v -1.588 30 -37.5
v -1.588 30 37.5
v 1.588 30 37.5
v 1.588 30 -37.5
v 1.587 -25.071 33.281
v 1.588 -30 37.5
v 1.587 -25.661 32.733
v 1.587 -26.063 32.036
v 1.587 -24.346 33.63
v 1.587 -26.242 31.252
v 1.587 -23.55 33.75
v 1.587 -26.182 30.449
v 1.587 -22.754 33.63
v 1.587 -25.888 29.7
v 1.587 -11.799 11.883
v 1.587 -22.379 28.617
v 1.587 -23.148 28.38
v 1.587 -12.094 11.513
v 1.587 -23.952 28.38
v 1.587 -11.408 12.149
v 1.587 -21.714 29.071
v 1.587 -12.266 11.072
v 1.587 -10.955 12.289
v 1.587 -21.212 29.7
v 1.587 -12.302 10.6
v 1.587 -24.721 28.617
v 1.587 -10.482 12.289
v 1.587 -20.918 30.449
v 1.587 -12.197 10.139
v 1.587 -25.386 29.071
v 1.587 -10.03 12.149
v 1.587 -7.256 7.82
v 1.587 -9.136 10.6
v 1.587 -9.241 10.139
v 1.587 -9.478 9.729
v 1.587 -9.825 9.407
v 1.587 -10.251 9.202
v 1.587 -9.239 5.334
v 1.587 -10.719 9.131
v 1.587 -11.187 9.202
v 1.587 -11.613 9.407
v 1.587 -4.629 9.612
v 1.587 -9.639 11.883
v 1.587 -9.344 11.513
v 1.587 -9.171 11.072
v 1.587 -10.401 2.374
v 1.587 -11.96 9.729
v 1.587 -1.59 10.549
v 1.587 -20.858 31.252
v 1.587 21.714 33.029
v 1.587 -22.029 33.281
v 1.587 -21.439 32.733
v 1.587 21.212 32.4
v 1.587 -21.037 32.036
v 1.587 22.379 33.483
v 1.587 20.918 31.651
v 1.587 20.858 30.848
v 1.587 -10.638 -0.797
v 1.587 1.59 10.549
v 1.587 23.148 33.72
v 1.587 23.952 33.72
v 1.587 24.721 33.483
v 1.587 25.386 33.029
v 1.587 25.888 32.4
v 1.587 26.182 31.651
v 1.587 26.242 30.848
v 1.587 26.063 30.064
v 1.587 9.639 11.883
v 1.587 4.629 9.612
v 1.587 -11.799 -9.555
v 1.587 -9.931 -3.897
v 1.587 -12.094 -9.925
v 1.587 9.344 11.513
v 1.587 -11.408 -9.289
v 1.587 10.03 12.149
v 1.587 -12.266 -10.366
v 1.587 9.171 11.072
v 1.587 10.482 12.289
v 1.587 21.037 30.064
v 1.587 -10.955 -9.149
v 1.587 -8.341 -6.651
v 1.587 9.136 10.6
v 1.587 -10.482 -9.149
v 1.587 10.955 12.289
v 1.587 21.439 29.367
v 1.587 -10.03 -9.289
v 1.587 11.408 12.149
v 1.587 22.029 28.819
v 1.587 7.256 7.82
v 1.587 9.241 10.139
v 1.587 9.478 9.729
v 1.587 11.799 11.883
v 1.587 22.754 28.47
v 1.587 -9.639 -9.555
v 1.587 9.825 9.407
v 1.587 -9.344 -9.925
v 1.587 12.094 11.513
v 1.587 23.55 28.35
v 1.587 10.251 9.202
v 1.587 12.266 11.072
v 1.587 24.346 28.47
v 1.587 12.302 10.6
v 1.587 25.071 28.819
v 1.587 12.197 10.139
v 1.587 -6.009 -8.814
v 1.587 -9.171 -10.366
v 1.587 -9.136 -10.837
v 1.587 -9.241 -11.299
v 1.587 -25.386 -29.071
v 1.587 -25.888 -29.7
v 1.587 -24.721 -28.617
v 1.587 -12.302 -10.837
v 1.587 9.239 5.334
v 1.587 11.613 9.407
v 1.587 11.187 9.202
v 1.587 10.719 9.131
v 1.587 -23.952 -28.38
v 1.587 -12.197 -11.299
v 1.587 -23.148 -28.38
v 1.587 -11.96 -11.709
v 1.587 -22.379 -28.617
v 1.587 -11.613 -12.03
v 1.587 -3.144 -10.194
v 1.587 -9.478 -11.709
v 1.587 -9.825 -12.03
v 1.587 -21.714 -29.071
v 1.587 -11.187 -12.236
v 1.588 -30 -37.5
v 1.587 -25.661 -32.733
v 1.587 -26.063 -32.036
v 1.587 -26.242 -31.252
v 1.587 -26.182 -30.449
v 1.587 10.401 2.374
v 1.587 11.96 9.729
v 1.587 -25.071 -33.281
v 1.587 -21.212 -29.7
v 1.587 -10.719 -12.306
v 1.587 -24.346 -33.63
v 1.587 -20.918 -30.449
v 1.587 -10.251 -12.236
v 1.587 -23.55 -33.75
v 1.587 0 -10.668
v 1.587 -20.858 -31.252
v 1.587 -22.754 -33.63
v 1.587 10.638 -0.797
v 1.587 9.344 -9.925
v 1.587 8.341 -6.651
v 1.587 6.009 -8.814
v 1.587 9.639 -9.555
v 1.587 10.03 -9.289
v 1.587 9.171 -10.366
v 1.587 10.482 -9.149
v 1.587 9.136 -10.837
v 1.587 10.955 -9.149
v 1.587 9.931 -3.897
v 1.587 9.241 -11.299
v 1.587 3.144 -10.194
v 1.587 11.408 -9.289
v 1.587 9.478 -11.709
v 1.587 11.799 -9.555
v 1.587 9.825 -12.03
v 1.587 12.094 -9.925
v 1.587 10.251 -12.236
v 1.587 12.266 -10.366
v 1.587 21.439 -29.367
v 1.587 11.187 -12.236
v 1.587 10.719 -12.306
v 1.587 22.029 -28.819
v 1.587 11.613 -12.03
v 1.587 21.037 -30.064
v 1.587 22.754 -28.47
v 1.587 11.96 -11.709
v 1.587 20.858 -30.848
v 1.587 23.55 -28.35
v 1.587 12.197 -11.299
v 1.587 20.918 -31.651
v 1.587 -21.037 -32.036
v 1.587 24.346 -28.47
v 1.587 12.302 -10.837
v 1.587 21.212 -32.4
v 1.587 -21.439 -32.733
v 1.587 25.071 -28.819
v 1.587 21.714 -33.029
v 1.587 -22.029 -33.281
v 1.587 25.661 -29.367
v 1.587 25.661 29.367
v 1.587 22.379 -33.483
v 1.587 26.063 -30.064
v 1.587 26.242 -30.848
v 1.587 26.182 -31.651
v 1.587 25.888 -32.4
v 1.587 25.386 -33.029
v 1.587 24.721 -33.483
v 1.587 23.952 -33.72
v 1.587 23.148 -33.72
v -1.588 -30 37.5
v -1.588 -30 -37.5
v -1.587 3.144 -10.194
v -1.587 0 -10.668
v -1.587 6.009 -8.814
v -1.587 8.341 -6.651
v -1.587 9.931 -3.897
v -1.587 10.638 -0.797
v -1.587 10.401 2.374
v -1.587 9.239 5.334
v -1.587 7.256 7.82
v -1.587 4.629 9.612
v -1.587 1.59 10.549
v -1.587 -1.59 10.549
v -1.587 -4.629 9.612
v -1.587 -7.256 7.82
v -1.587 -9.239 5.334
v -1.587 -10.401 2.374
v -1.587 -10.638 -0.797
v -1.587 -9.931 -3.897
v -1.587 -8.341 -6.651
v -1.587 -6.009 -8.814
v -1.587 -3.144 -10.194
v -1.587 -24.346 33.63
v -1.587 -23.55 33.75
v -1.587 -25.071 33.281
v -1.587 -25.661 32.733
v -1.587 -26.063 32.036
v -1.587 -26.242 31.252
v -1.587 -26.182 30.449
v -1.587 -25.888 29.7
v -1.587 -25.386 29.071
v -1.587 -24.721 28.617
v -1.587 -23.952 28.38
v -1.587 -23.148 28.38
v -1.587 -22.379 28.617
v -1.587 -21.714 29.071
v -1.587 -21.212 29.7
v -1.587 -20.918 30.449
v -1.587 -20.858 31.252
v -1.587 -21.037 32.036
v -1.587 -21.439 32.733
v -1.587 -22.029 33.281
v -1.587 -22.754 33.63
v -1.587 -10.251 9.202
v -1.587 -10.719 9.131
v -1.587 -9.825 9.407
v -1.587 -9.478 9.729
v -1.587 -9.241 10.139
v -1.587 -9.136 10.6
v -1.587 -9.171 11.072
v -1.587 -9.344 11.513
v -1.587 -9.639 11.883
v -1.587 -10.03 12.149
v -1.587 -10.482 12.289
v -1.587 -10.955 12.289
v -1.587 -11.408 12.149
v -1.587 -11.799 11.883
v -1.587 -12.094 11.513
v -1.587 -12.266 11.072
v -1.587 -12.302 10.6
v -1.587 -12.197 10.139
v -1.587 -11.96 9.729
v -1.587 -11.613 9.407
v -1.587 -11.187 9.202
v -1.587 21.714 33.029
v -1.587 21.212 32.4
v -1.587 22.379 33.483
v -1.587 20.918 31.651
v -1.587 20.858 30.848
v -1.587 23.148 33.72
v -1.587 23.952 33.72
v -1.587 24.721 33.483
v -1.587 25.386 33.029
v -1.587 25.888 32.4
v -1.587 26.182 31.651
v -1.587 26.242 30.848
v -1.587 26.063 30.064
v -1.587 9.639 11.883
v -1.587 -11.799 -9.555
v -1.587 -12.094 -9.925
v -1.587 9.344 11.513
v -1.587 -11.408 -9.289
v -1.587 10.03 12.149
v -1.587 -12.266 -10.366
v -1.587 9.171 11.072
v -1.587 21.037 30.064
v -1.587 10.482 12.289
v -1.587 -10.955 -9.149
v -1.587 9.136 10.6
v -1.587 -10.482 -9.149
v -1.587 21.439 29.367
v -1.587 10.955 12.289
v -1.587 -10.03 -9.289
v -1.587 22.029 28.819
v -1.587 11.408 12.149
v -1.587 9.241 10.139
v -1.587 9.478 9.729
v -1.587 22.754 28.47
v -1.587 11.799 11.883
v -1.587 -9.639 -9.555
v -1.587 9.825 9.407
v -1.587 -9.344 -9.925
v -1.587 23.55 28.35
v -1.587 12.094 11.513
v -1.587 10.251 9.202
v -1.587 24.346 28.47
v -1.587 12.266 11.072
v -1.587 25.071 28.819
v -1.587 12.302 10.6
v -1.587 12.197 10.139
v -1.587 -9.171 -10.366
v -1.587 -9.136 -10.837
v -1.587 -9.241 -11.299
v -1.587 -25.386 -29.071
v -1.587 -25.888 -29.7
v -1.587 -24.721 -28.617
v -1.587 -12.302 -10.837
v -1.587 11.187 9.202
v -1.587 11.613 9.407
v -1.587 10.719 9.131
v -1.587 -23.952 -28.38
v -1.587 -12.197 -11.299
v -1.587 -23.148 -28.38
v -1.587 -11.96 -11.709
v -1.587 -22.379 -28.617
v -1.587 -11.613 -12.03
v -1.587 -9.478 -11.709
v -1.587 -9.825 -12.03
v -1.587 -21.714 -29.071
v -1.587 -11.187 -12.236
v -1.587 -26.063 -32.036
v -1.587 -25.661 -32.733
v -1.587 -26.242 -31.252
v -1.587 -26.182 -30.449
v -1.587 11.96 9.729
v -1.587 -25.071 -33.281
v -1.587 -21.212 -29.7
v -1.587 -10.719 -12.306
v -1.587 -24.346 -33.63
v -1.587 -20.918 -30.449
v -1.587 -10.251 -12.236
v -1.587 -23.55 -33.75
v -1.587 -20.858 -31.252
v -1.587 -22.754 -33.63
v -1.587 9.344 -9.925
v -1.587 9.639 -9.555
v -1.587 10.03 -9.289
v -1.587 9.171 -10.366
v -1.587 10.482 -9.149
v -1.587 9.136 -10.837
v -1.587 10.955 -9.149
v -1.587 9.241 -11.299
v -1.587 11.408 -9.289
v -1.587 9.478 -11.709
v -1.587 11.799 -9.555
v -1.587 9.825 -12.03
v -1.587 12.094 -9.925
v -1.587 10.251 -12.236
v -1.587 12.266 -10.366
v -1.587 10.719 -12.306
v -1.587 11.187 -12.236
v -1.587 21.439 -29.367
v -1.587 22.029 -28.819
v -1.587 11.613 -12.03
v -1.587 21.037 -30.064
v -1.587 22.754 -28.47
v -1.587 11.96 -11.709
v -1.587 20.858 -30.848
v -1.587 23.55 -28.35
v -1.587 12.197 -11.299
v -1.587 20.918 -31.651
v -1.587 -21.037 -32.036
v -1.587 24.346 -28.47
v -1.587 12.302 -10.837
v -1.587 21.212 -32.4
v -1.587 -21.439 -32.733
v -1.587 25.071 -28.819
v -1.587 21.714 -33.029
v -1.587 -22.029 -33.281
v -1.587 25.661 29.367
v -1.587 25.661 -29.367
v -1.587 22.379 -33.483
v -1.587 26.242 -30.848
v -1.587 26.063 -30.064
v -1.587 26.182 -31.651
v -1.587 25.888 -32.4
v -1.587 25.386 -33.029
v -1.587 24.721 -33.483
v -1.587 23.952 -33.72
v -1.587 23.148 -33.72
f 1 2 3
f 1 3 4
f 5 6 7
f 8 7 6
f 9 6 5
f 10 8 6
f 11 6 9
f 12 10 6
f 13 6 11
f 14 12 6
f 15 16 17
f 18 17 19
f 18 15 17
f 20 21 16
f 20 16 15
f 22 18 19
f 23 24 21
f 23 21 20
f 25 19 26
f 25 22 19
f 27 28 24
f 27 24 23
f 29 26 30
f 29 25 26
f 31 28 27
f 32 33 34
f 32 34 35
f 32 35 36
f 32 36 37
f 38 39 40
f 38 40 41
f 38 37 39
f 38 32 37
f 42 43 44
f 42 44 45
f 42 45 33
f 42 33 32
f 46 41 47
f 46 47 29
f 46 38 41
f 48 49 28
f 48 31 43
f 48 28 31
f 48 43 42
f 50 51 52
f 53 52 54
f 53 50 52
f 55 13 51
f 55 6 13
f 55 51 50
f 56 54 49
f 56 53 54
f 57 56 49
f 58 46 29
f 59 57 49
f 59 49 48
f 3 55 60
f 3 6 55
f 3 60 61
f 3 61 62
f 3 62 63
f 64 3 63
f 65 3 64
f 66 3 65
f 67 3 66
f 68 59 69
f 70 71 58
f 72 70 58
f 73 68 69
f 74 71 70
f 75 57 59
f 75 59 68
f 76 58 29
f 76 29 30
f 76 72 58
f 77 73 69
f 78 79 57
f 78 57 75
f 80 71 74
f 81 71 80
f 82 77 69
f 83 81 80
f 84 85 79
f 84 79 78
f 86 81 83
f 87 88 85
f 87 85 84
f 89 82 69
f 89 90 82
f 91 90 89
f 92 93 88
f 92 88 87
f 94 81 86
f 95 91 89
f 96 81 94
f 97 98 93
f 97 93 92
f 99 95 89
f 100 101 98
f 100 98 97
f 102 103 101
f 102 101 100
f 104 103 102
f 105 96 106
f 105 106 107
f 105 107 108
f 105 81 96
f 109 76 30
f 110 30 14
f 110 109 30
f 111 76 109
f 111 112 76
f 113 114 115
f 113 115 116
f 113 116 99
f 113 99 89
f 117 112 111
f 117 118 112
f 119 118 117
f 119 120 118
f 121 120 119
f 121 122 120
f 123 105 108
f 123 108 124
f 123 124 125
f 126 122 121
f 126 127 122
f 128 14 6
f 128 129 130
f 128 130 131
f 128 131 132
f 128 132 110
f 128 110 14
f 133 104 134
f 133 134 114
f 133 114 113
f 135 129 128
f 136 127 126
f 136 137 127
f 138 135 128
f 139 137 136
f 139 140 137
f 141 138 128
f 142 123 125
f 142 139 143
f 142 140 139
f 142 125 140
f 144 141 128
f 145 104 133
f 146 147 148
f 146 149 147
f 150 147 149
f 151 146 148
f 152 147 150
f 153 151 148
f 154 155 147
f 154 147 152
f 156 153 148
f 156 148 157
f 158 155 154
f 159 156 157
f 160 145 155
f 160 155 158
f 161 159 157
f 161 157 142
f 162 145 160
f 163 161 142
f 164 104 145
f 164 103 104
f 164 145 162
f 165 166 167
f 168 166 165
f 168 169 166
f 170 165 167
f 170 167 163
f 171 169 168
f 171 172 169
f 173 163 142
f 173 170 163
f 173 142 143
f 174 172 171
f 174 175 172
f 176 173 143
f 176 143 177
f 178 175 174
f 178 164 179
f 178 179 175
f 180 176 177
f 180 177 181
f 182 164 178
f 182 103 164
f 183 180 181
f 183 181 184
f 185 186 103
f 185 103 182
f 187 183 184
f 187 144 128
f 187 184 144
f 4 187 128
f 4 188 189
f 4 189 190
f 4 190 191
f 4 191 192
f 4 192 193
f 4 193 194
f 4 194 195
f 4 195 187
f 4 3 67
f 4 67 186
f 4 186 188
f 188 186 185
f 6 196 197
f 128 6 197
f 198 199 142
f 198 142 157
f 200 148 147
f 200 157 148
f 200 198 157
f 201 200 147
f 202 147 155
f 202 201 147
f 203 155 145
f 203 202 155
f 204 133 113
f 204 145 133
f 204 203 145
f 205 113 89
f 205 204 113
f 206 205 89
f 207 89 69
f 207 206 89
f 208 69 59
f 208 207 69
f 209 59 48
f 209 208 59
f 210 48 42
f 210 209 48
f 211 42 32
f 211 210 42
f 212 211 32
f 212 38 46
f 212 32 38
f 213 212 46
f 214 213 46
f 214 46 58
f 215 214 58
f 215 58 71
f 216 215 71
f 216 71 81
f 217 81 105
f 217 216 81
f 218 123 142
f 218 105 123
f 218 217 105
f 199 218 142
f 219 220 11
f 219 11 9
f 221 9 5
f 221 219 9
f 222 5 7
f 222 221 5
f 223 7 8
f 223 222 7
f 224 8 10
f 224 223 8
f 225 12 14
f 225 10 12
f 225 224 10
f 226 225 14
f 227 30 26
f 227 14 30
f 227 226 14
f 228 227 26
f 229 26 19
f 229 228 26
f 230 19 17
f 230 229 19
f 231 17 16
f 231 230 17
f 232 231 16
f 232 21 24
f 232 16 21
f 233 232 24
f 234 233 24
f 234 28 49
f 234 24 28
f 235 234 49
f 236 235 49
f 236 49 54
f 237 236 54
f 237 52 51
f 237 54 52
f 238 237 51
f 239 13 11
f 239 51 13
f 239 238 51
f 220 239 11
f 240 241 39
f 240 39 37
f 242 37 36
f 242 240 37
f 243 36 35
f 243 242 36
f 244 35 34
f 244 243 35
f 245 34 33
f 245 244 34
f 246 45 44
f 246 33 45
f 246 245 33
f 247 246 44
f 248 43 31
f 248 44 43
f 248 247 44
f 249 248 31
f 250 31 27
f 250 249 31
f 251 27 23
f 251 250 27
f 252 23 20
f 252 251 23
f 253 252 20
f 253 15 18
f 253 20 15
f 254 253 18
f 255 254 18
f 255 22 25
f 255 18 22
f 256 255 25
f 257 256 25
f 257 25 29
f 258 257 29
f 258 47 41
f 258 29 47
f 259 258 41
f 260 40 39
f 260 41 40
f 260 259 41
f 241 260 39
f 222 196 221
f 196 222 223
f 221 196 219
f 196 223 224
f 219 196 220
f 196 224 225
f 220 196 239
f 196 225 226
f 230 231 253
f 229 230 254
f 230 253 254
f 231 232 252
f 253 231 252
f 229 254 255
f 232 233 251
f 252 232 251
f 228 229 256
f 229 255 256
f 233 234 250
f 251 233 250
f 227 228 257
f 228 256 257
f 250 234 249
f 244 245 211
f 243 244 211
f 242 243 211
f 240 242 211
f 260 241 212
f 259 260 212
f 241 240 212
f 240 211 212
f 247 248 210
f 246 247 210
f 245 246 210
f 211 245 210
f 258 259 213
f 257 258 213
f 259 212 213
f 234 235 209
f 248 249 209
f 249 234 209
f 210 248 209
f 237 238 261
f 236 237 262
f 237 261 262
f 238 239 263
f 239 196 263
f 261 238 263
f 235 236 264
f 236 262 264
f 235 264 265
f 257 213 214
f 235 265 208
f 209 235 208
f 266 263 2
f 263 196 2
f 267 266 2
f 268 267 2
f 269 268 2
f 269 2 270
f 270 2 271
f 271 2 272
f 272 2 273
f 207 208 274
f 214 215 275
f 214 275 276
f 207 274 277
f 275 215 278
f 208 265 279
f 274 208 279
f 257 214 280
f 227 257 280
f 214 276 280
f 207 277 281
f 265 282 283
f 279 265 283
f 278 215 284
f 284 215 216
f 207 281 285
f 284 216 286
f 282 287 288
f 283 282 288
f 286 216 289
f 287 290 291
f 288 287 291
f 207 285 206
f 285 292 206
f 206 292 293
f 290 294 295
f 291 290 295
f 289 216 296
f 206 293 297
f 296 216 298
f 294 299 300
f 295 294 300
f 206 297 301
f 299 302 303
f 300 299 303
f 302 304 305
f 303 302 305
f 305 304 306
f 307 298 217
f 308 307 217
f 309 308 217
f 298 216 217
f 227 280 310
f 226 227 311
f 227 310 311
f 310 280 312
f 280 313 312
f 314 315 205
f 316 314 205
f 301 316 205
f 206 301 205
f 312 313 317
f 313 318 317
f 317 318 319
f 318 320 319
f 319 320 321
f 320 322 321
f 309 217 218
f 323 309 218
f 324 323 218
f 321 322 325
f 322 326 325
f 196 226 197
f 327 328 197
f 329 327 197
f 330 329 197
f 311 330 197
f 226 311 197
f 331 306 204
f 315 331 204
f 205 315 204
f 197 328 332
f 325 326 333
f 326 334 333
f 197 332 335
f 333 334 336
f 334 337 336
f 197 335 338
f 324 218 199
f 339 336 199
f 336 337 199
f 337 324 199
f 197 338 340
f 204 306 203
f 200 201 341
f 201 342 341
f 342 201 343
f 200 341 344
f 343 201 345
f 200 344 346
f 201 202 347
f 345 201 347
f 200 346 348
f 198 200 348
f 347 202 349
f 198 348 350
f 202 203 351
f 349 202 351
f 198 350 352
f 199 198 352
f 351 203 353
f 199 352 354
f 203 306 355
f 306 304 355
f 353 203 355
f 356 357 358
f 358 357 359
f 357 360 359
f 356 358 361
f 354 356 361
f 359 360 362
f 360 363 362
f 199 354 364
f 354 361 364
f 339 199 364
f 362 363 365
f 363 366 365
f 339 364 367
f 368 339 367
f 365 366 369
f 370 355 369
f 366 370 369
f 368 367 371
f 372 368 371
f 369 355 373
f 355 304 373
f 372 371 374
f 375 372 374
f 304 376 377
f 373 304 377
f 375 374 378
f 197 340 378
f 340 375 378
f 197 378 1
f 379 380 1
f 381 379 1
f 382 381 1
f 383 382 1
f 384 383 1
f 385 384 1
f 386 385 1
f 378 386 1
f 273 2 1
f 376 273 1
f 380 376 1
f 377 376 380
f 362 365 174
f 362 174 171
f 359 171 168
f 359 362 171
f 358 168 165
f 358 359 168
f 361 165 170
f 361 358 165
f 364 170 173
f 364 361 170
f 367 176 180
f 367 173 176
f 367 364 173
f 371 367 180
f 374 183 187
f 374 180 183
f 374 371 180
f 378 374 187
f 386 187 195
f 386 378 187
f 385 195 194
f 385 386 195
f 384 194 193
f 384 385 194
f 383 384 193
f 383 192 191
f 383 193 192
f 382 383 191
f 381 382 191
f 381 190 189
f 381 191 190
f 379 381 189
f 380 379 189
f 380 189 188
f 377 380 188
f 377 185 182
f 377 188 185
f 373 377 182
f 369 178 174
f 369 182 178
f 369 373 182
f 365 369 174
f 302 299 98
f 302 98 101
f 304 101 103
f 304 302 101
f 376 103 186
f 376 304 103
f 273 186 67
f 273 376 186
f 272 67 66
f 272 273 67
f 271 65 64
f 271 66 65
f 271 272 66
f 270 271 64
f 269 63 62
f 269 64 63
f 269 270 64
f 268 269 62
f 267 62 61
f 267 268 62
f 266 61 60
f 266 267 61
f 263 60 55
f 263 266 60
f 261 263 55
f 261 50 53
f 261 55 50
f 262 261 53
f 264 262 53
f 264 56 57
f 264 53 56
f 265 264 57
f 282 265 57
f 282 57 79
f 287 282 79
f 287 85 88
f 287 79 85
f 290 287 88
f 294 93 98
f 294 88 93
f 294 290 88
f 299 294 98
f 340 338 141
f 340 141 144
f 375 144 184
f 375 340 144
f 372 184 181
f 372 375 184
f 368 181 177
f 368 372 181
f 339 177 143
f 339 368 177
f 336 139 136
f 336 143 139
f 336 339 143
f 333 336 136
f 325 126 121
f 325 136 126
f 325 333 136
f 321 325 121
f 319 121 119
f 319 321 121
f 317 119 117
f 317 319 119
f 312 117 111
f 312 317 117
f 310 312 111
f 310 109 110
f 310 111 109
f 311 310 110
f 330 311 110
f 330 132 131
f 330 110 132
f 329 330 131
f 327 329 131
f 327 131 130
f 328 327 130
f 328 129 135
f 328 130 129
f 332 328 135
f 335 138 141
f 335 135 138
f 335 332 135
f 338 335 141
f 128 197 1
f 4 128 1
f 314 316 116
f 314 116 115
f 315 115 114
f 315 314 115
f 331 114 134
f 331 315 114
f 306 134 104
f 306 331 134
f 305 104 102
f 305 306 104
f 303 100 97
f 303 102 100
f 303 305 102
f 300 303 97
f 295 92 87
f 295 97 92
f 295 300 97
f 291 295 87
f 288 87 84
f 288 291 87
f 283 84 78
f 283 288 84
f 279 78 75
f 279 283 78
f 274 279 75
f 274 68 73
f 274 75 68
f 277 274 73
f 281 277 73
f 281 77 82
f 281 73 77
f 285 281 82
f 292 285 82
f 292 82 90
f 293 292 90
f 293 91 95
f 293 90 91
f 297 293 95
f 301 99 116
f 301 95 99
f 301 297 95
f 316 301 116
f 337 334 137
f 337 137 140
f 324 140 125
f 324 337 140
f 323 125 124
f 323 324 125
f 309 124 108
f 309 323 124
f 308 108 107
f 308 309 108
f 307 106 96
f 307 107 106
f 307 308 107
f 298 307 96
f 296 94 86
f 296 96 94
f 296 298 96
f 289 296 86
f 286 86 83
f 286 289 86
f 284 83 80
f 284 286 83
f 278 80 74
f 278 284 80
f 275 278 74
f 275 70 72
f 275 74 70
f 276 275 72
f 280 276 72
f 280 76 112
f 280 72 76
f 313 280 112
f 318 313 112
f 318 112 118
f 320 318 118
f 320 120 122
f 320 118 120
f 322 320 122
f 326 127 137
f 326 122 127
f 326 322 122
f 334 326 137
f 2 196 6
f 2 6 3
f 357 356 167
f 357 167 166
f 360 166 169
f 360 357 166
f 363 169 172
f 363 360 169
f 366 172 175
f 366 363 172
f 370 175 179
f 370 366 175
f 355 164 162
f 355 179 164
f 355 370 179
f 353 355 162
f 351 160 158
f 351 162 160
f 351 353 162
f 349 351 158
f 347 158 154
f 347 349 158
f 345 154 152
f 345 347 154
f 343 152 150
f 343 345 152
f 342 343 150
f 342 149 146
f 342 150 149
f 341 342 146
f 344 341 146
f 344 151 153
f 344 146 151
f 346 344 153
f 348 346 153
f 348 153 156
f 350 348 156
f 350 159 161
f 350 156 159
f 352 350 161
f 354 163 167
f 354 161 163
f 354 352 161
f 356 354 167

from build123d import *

# Parameters (mm, degrees)
BOSS_EXTRUDE1_DEPTH      = 1.5875
BOSS_EXTRUDE1_DEPTH_BACK = 1.5875
SKETCH1_W                = 75
SKETCH1_H                = 60
CUT_EXTRUDE1_DEPTH       = 49.049663435
CUT_EXTRUDE1_DEPTH_BACK  = 49.049663435
SKETCH2_R                = 2.7
CUT_EXTRUDE2_DEPTH       = 49.049663435
CUT_EXTRUDE2_DEPTH_BACK  = 49.049663435
SKETCH3_R                = 10.668
SKETCH3_R_2              = 1.5875


with BuildPart() as part:
    # Sketch1 → Boss-Extrude1 (new, two sides: drawn at the far end of the back side and taken through both)
    with BuildSketch(Plane(origin=(0, 0, 0), x_dir=(0, 0, -1), z_dir=(1, 0, 0)).offset(-BOSS_EXTRUDE1_DEPTH_BACK)):
        Rectangle(SKETCH1_W, SKETCH1_H)
    extrude(amount=BOSS_EXTRUDE1_DEPTH + BOSS_EXTRUDE1_DEPTH_BACK)

    # Sketch2 → Cut-Extrude1 (cut, two sides: drawn at the far end of the back side and taken through both)
    with BuildSketch(Plane(origin=(0, 0, 0), x_dir=(0, 0, -1), z_dir=(1, 0, 0)).offset(-CUT_EXTRUDE1_DEPTH_BACK)):
        with Locations((-31.05, 23.55)):
            Circle(SKETCH2_R)
        with Locations((31.05, 23.55)):
            Circle(SKETCH2_R)
        with Locations((31.05, -23.55)):
            Circle(SKETCH2_R)
        with Locations((-31.05, -23.55)):
            Circle(SKETCH2_R)
    extrude(amount=CUT_EXTRUDE1_DEPTH + CUT_EXTRUDE1_DEPTH_BACK, mode=Mode.SUBTRACT)

    # Sketch3 → Cut-Extrude2 (cut, two sides: drawn at the far end of the back side and taken through both)
    with BuildSketch(Plane(origin=(0, 0, 0), x_dir=(0, 0, -1), z_dir=(1, 0, 0)).offset(-CUT_EXTRUDE2_DEPTH_BACK)):
        Circle(SKETCH3_R)
        with Locations((-10.7188, 10.7188)):
            Circle(SKETCH3_R_2)
        with Locations((10.7188, 10.7188)):
            Circle(SKETCH3_R_2)
        with Locations((10.7188, -10.7188)):
            Circle(SKETCH3_R_2)
        with Locations((-10.7188, -10.7188)):
            Circle(SKETCH3_R_2)
    extrude(amount=CUT_EXTRUDE2_DEPTH + CUT_EXTRUDE2_DEPTH_BACK, mode=Mode.SUBTRACT)


solid = part.part
